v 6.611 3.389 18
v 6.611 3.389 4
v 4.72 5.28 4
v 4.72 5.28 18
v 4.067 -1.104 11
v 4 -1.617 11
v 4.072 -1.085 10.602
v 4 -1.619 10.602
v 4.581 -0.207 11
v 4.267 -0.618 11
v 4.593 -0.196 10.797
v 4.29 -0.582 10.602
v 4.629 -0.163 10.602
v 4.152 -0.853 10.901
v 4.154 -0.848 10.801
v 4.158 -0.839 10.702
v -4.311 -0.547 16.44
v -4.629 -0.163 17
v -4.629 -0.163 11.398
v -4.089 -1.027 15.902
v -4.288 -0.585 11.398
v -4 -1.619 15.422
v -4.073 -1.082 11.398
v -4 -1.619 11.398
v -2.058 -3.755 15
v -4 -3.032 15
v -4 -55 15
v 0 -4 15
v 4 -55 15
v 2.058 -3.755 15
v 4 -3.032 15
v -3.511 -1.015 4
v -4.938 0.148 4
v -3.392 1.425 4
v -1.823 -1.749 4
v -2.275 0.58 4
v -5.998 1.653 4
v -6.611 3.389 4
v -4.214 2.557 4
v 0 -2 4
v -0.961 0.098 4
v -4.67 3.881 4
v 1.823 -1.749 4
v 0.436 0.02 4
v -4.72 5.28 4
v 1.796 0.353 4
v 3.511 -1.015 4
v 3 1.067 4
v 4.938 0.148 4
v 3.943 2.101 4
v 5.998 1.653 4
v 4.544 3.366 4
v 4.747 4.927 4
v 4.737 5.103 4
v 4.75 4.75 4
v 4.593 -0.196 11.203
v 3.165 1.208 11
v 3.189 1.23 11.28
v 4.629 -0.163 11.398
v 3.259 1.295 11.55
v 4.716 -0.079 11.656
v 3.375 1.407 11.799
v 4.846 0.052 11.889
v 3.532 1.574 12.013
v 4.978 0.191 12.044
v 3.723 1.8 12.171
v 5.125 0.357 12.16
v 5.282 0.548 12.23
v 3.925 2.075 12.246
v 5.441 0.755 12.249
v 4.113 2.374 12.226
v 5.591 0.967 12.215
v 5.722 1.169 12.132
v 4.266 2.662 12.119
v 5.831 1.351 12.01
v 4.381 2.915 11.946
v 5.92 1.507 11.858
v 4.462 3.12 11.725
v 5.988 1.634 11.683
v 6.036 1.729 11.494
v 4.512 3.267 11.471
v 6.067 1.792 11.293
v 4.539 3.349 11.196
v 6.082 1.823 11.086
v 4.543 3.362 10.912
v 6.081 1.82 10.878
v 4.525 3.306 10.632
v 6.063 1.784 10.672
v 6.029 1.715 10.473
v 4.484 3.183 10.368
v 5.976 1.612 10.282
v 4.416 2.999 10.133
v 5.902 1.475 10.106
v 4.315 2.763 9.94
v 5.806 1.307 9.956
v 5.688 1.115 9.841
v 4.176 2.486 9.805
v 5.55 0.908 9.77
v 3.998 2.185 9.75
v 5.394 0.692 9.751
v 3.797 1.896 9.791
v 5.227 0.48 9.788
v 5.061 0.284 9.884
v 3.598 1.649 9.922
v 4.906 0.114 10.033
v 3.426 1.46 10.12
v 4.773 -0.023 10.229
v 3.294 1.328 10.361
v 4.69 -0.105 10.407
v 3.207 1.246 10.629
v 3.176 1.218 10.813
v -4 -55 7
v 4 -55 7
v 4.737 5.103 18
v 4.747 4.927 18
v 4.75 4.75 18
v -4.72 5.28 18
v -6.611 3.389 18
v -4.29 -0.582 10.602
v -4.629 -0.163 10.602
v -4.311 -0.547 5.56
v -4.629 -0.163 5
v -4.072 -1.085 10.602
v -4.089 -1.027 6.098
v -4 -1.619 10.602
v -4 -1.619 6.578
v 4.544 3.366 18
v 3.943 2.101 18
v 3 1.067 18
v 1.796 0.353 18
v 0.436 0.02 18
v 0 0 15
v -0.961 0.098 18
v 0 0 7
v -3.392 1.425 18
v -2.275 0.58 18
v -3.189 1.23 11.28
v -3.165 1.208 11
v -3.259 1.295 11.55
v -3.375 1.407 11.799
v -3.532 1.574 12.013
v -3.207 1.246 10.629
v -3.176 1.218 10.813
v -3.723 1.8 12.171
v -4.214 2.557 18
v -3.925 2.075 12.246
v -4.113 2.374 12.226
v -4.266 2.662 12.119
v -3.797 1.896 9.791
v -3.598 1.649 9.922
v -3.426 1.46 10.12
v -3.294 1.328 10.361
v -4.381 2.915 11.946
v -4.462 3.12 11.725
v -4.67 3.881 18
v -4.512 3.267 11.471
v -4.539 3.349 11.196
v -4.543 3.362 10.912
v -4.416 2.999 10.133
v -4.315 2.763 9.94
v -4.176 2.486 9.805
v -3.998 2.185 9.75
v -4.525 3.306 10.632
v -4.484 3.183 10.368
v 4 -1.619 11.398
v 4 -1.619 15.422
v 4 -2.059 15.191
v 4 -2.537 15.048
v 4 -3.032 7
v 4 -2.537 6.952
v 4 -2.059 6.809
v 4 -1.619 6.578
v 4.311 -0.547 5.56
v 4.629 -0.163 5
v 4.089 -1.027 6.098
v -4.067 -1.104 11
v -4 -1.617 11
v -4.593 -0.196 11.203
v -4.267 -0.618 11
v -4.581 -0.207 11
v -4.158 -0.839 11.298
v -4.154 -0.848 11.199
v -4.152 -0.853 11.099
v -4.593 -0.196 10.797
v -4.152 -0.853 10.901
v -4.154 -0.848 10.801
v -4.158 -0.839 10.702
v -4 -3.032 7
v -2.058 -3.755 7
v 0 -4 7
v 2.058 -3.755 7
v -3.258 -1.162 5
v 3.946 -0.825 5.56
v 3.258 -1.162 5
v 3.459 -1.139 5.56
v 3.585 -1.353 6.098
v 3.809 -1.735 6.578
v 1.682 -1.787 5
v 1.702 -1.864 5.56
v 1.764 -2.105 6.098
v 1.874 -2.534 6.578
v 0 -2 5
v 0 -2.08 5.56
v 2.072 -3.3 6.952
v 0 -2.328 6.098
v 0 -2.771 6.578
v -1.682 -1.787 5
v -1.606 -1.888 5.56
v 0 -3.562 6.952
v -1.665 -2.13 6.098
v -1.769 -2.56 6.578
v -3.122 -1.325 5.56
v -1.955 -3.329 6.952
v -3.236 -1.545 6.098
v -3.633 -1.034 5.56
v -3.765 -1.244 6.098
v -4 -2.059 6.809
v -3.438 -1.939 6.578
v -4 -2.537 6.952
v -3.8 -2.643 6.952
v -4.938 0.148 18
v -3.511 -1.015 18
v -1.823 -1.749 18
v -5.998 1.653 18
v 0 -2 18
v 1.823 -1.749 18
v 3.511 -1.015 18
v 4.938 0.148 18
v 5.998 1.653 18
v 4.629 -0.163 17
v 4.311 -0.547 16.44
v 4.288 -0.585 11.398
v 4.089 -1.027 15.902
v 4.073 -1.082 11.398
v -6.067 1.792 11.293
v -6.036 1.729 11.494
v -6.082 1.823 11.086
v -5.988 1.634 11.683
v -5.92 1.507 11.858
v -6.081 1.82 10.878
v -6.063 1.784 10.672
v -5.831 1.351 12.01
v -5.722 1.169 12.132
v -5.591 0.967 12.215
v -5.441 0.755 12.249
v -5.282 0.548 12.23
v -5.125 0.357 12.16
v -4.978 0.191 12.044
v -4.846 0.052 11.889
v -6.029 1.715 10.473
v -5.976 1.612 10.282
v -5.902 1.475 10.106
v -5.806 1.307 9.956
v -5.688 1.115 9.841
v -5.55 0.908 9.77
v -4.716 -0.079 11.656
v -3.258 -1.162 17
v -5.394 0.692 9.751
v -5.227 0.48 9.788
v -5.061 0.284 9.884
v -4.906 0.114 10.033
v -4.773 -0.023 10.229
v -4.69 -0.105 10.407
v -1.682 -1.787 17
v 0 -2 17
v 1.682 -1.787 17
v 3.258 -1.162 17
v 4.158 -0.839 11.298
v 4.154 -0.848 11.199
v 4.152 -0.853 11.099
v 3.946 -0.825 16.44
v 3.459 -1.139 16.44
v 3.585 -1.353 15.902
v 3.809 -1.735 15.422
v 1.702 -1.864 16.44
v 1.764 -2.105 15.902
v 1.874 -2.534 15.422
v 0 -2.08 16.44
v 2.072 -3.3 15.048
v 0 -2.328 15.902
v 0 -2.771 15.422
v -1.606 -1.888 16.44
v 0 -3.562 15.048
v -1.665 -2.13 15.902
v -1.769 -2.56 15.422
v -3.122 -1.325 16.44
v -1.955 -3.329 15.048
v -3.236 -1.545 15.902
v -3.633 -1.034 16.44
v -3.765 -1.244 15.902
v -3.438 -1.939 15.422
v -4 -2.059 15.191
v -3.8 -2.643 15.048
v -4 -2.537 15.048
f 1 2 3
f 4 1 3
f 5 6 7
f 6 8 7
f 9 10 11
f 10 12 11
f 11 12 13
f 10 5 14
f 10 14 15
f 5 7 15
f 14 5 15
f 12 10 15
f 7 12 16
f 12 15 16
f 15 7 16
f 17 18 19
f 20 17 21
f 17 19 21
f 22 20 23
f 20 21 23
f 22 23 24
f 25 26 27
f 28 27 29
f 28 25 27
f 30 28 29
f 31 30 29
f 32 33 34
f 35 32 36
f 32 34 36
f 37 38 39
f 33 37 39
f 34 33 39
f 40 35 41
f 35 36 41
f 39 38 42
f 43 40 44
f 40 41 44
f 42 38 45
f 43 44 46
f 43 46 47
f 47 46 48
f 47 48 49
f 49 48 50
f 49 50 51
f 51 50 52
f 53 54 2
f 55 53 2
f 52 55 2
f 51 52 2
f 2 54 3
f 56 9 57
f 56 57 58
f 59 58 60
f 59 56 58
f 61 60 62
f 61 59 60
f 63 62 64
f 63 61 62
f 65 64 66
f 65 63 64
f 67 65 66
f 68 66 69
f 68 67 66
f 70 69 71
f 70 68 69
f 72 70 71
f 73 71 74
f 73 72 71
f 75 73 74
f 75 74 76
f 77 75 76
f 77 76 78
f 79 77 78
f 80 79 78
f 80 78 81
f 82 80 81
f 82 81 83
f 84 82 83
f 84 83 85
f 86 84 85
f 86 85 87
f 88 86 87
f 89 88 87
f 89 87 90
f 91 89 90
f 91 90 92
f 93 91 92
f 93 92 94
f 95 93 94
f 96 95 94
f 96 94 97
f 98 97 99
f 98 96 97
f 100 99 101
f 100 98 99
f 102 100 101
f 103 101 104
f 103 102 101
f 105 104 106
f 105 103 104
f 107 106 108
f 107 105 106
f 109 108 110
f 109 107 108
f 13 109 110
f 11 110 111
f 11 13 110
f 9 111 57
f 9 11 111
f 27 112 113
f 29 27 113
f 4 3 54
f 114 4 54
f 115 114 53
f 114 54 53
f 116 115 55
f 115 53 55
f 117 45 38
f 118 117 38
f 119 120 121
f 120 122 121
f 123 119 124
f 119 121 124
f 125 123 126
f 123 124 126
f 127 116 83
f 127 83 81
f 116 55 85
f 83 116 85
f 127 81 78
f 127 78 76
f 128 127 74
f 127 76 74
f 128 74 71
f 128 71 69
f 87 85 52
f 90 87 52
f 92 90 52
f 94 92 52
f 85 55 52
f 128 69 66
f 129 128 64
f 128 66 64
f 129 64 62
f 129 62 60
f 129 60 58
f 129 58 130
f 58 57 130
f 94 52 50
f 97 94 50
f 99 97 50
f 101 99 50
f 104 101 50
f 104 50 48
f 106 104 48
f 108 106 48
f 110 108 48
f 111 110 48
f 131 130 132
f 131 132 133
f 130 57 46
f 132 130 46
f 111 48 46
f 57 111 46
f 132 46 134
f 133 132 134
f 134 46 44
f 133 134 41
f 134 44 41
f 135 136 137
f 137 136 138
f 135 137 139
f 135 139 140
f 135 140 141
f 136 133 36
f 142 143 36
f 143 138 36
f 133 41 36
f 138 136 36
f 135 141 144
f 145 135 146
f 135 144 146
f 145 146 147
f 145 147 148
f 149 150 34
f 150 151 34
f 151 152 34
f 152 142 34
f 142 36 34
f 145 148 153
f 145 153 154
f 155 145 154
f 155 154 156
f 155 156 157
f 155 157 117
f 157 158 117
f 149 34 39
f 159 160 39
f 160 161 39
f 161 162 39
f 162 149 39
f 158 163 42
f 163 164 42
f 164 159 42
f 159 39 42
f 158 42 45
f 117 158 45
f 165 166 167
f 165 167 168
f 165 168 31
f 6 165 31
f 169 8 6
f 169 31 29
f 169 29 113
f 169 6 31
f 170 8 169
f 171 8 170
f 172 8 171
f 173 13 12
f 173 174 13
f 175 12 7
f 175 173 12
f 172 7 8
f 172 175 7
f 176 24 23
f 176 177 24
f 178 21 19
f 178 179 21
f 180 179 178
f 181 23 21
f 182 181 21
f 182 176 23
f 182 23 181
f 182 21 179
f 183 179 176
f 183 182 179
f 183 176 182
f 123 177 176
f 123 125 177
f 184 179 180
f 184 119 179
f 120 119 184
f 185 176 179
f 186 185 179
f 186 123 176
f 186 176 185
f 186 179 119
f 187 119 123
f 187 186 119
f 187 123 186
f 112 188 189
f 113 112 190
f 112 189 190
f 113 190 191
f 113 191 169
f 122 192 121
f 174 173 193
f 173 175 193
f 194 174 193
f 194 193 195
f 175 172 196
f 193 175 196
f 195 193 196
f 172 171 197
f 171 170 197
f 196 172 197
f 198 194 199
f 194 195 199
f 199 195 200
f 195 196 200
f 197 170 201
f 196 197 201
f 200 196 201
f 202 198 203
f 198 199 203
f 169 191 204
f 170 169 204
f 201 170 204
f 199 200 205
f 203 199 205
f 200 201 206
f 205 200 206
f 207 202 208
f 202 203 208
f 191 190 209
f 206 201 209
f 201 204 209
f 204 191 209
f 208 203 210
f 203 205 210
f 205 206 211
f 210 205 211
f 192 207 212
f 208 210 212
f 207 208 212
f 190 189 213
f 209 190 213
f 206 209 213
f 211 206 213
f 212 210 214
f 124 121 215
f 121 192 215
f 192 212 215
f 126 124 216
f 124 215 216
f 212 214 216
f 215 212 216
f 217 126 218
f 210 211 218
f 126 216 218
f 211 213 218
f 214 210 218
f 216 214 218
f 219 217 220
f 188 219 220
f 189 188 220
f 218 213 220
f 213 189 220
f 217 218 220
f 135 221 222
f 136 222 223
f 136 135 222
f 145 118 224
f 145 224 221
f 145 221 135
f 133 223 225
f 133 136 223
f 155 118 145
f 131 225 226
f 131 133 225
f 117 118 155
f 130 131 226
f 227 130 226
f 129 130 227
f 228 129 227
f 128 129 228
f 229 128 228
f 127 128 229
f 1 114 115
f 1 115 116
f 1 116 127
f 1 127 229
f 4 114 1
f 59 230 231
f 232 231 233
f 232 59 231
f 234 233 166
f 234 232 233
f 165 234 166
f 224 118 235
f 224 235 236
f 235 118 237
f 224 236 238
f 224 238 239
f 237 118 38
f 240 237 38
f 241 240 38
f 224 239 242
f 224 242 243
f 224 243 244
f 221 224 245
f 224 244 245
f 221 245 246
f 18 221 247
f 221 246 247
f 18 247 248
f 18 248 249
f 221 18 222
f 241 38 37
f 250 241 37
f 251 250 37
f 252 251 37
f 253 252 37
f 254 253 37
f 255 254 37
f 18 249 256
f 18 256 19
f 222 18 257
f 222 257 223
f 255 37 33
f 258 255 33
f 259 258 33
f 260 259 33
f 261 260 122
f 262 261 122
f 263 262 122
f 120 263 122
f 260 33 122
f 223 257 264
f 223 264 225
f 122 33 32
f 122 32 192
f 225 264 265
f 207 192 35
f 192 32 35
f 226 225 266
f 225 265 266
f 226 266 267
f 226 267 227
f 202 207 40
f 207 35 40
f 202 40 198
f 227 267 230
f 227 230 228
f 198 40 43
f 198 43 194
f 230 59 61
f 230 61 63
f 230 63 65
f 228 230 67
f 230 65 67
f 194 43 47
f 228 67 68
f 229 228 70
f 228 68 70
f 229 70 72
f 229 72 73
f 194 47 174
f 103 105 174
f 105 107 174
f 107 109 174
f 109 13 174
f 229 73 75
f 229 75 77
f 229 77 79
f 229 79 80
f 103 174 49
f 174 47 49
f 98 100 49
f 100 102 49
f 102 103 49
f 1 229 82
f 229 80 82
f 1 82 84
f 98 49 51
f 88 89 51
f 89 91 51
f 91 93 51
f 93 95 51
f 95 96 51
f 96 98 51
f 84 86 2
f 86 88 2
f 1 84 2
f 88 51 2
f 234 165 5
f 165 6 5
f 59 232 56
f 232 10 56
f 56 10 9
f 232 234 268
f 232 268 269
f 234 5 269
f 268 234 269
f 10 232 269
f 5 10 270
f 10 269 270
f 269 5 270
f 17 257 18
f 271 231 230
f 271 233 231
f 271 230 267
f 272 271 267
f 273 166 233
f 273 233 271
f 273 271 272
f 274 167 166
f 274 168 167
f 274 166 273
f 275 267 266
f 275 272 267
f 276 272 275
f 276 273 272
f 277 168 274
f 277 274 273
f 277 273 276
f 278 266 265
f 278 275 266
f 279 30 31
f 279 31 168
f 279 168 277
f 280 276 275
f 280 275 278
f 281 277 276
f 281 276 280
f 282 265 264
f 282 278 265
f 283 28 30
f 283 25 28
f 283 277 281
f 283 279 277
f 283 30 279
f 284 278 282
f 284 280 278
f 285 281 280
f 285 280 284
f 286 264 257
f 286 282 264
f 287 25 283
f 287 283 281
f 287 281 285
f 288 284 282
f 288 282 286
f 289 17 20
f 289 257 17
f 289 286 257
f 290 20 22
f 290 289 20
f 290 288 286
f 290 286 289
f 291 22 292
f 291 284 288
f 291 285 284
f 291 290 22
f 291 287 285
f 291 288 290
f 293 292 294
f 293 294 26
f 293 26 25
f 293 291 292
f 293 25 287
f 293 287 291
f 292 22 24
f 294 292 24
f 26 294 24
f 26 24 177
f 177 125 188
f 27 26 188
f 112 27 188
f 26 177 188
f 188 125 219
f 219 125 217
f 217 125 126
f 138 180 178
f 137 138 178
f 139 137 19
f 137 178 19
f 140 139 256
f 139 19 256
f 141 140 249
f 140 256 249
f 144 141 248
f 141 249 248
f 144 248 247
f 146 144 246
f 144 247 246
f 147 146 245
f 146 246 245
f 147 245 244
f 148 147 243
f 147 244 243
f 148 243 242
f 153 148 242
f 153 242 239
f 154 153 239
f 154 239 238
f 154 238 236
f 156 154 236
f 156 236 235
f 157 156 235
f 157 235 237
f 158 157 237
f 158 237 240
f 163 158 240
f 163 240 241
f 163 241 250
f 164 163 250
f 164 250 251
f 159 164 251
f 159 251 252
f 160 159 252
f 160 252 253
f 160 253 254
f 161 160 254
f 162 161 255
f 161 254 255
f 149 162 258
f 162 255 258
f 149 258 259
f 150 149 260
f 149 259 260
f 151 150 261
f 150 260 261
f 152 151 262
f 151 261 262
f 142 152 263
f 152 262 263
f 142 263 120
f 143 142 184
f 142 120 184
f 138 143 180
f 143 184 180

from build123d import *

# Parameters (mm, degrees)
SKETCH1_W           = 8
SKETCH1_H           = 8
BOSS_EXTRUDE1_DEPTH = 55
BOSS_EXTRUDE2_START = 4
BOSS_EXTRUDE2_DEPTH = 14
SKETCH4_R           = 1.25
CUT_EXTRUDE1_DEPTH  = 17.337084372
FILLET1_R           = 2


with BuildPart() as part:
    # Sketch1 → Boss-Extrude1 (new body)
    with BuildSketch(Plane(origin=(0, 0, 0), x_dir=(1, 0, 0), z_dir=(0, 1, 0))):
        with Locations((0, -11)):
            Rectangle(SKETCH1_W, SKETCH1_H)
    extrude(amount=-BOSS_EXTRUDE1_DEPTH)

    # Sketch2 → Boss-Extrude2 (add)
    with BuildSketch(Plane.XY.offset(BOSS_EXTRUDE2_START)):
        with BuildLine():
            Line((-4.720381827, 5.279618173), (-6.61130468, 3.38869532))
            ThreePointArc((-6.61130468, 3.38869532), (0, -2), (6.61130468, 3.38869532))
            Line((6.61130468, 3.38869532), (4.720381827, 5.279618173))
            ThreePointArc((4.720381827, 5.279618173), (4.742589676, 5.015222852), (4.75, 4.75))
            ThreePointArc((4.75, 4.75), (-0.265222852, 0.007410324), (-4.720381827, 5.279618173))
        make_face()
    extrude(amount=BOSS_EXTRUDE2_DEPTH)

    # Sketch4 → Cut-Extrude1 (cut, through all)
    with BuildSketch(Plane(origin=(-5.606601718, -5.606601718, 0), x_dir=(0.707106781, -0.707106781, 0), z_dir=(-0.707106781, -0.707106781, 0))):
        with Locations((-4.342545211, 11)):
            Circle(SKETCH4_R)
    cut_extrude1 = extrude(amount=-CUT_EXTRUDE1_DEPTH, mode=Mode.SUBTRACT)

    # Mirror1: Cut-Extrude1 across plane
    add(cut_extrude1.mirror(Plane(origin=(0, 0, 0), x_dir=(0, 0, 1), z_dir=(1, 0, 0))), mode=Mode.SUBTRACT)

    # Fillet1
    fillet1_edges = [part.edges().sort_by_distance(p)[0] for p in [
        (4, -0.687140793, 11),
        (-4, -0.687140793, 11),
        (0, -2, 15),
        (0, -2, 7),
    ]]
    fillet(fillet1_edges, radius=FILLET1_R)


solid = part.part
